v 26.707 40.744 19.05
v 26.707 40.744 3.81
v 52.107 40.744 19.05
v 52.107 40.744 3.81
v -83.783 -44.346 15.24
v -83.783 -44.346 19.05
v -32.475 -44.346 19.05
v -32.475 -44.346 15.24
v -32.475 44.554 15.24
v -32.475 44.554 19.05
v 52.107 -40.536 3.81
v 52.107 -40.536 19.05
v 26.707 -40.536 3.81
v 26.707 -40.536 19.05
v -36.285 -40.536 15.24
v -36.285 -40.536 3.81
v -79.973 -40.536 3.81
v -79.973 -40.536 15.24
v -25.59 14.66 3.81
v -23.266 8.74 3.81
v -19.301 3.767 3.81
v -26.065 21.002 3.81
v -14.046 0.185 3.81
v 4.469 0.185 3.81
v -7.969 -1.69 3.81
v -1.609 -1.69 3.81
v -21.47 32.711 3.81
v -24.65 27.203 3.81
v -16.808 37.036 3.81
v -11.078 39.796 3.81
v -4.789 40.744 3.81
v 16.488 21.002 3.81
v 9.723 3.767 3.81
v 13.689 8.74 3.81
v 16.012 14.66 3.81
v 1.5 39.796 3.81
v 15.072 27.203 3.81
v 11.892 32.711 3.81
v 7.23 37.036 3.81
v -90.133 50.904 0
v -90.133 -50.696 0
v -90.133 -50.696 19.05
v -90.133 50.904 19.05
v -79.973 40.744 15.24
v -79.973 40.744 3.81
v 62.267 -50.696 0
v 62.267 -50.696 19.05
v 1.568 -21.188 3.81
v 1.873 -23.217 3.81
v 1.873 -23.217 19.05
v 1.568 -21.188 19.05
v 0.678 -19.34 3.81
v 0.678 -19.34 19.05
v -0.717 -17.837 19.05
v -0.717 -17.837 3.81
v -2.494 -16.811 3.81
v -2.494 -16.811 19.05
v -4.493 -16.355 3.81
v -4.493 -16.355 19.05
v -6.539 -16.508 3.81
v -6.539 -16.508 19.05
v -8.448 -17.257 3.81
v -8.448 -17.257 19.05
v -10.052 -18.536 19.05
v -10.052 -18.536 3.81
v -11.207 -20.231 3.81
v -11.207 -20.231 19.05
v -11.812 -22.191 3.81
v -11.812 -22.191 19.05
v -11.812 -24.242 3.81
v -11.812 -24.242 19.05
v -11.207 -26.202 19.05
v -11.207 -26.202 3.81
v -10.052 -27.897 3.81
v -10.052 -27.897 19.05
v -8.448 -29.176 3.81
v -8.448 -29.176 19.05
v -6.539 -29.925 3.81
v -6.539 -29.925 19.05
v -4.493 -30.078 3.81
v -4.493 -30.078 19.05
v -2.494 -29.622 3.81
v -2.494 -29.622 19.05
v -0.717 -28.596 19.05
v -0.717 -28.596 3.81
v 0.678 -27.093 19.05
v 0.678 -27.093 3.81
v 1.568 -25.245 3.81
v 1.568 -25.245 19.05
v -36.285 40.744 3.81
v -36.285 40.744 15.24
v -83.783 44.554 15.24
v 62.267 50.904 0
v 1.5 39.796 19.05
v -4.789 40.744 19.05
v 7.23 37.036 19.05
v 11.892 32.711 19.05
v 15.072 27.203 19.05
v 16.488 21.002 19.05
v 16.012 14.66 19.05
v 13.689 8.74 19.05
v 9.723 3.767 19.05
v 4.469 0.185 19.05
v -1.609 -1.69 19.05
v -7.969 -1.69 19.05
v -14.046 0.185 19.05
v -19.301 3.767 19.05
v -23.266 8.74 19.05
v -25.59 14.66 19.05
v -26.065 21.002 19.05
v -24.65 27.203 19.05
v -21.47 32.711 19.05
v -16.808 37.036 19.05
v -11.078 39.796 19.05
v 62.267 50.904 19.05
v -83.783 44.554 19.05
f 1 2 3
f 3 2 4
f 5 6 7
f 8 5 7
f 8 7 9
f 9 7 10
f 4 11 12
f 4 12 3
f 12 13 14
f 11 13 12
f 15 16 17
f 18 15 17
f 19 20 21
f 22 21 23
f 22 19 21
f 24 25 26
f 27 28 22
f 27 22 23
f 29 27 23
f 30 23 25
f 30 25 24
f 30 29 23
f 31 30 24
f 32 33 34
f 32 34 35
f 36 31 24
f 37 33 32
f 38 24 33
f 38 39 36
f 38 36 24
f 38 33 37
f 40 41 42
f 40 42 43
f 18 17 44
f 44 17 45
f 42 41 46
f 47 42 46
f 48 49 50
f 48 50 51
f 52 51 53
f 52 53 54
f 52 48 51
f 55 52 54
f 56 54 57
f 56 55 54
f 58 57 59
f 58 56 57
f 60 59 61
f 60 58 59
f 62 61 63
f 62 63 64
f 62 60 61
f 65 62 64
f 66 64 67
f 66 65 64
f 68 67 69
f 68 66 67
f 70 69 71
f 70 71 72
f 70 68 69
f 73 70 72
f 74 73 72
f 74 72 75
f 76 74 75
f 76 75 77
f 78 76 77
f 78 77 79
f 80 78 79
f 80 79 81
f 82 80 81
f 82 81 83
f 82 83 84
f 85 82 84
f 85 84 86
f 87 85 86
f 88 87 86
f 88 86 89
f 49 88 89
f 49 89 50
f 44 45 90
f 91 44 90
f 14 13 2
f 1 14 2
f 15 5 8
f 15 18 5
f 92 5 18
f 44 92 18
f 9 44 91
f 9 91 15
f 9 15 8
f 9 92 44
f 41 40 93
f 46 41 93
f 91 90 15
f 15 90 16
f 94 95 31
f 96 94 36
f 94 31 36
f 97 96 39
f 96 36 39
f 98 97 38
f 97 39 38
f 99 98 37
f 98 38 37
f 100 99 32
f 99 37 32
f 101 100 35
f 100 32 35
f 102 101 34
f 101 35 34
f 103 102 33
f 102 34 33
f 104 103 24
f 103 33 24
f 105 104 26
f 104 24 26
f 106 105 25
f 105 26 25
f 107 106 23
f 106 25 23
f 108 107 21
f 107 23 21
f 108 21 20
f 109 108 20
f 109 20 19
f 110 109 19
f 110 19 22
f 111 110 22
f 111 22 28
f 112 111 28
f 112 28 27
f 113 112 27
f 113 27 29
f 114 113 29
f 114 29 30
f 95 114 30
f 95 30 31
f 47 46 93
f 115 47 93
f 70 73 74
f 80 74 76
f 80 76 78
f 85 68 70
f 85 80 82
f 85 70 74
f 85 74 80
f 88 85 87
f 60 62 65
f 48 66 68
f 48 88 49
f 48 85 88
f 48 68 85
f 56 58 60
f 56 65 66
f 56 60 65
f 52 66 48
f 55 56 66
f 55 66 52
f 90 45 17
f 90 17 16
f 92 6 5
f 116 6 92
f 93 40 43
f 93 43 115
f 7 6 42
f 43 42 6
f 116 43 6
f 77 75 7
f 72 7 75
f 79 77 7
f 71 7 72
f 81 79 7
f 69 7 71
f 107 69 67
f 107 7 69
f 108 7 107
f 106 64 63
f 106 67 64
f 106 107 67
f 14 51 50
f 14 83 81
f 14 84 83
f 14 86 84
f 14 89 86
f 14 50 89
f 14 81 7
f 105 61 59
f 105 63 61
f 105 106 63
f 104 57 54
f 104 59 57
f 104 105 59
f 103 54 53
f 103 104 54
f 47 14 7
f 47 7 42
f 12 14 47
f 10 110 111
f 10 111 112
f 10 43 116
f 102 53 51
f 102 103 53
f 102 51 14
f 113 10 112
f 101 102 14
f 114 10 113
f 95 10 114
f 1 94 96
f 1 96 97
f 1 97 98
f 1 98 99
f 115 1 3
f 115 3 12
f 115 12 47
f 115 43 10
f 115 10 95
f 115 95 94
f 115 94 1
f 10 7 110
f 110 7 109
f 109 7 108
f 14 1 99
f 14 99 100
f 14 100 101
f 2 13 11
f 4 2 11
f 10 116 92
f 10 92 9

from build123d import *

# Parameters (mm, degrees)
F0_W     = 152.4
F0_H     = 101.6
F0_W_2   = 25.4
F0_H_2   = 81.28
F0_R     = 6.8811471087
F1_DEPTH = 19.05
F2_DEPTH = 3.81
F3_W     = 51.308
F3_H     = 88.9
F3_W_2   = 43.688
F3_H_2   = 81.28
F4_DEPTH = 3.81


with BuildPart() as f1:
    # F0 (on Top) → F1 (new body)
    with BuildSketch(Plane.XY):
        with Locations((-13.9326911301, 0.1037381589)):
            Rectangle(F0_W, F0_H)
        Polygon((-79.9726911301, -4.4682618411), (-79.9726911301, 40.7437381589), (-36.2846911301, 40.7437381589), (-26.1246911301, 40.7437381589), (-4.7886911301, 40.7437381589), (16.5473088699, 40.7437381589), (16.5473088699, 19.4077381589), (16.5473088699, -40.5362618411), (-26.1246911301, -40.5362618411), (-36.2846911301, -40.5362618411), (-79.9726911301, -40.5362618411), align=None, mode=Mode.SUBTRACT)
        with Locations((39.4073088699, 0.1037381589)):
            Rectangle(F0_W_2, F0_H_2, mode=Mode.SUBTRACT)
        with BuildLine():
            ThreePointArc((16.5473088699, 19.4077381589), (-4.7886911301, -1.9282618411), (-26.1246911301, 19.4077381589))
            Line((-26.1246911301, 19.4077381589), (-26.1246911301, -40.5362618411))
            Line((-26.1246911301, -40.5362618411), (16.5473088699, -40.5362618411))
            Line((16.5473088699, -40.5362618411), (16.5473088699, 19.4077381589))
        make_face()
        with Locations((-5.0076562911, -23.2165120542)):
            Circle(F0_R, mode=Mode.SUBTRACT)
        with BuildLine():
            Line((16.5473088699, 40.7437381589), (-4.7886911301, 40.7437381589))
            ThreePointArc((-4.7886911301, 40.7437381589), (10.2981391533, 34.4945684423), (16.5473088699, 19.4077381589))
            Line((16.5473088699, 19.4077381589), (16.5473088699, 40.7437381589))
        make_face()
        with BuildLine():
            Line((-4.7886911301, 40.7437381589), (-26.1246911301, 40.7437381589))
            Line((-26.1246911301, 40.7437381589), (-26.1246911301, 19.4077381589))
            ThreePointArc((-26.1246911301, 19.4077381589), (-19.8755214135, 34.4945684423), (-4.7886911301, 40.7437381589))
        make_face()
        Polygon((-26.1246911301, 40.7437381589), (-36.2846911301, 40.7437381589), (-36.2846911301, -40.5362618411), (-26.1246911301, -40.5362618411), (-26.1246911301, 19.4077381589), align=None)
    extrude(amount=F1_DEPTH)

    # F0 (on Top) → F2 (join)
    with BuildSketch(Plane.XY):
        Polygon((-36.2846911301, 40.7437381589), (-79.9726911301, 40.7437381589), (-79.9726911301, -4.4682618411), (-79.9726911301, -40.5362618411), (-36.2846911301, -40.5362618411), align=None)
        with BuildLine():
            ThreePointArc((16.5473088699, 19.4077381589), (10.2981391533, 34.4945684423), (-4.7886911301, 40.7437381589))
            ThreePointArc((-4.7886911301, 40.7437381589), (-19.8755214135, 34.4945684423), (-26.1246911301, 19.4077381589))
            ThreePointArc((-26.1246911301, 19.4077381589), (-4.7886911301, -1.9282618411), (16.5473088699, 19.4077381589))
        make_face()
        with Locations((-5.0076562911, -23.2165120542)):
            Circle(F0_R)
        with Locations((39.4073088699, 0.1037381589)):
            Rectangle(F0_W_2, F0_H_2)
    extrude(amount=F2_DEPTH)

    # F3 (on face) → F4 (cut)
    with BuildSketch(Plane.XY.offset(19.05)):
        with Locations((-58.1286911301, 0.1037381589)):
            Rectangle(F3_W, F3_H)
        with Locations((-58.1286911301, 0.1037381589)):
            Rectangle(F3_W_2, F3_H_2, mode=Mode.SUBTRACT)
        with Locations((-58.1286911301, 0.1037381589)):
            Rectangle(F3_W_2, F3_H_2)
    extrude(amount=-F4_DEPTH, mode=Mode.SUBTRACT)


solid = f1.part
